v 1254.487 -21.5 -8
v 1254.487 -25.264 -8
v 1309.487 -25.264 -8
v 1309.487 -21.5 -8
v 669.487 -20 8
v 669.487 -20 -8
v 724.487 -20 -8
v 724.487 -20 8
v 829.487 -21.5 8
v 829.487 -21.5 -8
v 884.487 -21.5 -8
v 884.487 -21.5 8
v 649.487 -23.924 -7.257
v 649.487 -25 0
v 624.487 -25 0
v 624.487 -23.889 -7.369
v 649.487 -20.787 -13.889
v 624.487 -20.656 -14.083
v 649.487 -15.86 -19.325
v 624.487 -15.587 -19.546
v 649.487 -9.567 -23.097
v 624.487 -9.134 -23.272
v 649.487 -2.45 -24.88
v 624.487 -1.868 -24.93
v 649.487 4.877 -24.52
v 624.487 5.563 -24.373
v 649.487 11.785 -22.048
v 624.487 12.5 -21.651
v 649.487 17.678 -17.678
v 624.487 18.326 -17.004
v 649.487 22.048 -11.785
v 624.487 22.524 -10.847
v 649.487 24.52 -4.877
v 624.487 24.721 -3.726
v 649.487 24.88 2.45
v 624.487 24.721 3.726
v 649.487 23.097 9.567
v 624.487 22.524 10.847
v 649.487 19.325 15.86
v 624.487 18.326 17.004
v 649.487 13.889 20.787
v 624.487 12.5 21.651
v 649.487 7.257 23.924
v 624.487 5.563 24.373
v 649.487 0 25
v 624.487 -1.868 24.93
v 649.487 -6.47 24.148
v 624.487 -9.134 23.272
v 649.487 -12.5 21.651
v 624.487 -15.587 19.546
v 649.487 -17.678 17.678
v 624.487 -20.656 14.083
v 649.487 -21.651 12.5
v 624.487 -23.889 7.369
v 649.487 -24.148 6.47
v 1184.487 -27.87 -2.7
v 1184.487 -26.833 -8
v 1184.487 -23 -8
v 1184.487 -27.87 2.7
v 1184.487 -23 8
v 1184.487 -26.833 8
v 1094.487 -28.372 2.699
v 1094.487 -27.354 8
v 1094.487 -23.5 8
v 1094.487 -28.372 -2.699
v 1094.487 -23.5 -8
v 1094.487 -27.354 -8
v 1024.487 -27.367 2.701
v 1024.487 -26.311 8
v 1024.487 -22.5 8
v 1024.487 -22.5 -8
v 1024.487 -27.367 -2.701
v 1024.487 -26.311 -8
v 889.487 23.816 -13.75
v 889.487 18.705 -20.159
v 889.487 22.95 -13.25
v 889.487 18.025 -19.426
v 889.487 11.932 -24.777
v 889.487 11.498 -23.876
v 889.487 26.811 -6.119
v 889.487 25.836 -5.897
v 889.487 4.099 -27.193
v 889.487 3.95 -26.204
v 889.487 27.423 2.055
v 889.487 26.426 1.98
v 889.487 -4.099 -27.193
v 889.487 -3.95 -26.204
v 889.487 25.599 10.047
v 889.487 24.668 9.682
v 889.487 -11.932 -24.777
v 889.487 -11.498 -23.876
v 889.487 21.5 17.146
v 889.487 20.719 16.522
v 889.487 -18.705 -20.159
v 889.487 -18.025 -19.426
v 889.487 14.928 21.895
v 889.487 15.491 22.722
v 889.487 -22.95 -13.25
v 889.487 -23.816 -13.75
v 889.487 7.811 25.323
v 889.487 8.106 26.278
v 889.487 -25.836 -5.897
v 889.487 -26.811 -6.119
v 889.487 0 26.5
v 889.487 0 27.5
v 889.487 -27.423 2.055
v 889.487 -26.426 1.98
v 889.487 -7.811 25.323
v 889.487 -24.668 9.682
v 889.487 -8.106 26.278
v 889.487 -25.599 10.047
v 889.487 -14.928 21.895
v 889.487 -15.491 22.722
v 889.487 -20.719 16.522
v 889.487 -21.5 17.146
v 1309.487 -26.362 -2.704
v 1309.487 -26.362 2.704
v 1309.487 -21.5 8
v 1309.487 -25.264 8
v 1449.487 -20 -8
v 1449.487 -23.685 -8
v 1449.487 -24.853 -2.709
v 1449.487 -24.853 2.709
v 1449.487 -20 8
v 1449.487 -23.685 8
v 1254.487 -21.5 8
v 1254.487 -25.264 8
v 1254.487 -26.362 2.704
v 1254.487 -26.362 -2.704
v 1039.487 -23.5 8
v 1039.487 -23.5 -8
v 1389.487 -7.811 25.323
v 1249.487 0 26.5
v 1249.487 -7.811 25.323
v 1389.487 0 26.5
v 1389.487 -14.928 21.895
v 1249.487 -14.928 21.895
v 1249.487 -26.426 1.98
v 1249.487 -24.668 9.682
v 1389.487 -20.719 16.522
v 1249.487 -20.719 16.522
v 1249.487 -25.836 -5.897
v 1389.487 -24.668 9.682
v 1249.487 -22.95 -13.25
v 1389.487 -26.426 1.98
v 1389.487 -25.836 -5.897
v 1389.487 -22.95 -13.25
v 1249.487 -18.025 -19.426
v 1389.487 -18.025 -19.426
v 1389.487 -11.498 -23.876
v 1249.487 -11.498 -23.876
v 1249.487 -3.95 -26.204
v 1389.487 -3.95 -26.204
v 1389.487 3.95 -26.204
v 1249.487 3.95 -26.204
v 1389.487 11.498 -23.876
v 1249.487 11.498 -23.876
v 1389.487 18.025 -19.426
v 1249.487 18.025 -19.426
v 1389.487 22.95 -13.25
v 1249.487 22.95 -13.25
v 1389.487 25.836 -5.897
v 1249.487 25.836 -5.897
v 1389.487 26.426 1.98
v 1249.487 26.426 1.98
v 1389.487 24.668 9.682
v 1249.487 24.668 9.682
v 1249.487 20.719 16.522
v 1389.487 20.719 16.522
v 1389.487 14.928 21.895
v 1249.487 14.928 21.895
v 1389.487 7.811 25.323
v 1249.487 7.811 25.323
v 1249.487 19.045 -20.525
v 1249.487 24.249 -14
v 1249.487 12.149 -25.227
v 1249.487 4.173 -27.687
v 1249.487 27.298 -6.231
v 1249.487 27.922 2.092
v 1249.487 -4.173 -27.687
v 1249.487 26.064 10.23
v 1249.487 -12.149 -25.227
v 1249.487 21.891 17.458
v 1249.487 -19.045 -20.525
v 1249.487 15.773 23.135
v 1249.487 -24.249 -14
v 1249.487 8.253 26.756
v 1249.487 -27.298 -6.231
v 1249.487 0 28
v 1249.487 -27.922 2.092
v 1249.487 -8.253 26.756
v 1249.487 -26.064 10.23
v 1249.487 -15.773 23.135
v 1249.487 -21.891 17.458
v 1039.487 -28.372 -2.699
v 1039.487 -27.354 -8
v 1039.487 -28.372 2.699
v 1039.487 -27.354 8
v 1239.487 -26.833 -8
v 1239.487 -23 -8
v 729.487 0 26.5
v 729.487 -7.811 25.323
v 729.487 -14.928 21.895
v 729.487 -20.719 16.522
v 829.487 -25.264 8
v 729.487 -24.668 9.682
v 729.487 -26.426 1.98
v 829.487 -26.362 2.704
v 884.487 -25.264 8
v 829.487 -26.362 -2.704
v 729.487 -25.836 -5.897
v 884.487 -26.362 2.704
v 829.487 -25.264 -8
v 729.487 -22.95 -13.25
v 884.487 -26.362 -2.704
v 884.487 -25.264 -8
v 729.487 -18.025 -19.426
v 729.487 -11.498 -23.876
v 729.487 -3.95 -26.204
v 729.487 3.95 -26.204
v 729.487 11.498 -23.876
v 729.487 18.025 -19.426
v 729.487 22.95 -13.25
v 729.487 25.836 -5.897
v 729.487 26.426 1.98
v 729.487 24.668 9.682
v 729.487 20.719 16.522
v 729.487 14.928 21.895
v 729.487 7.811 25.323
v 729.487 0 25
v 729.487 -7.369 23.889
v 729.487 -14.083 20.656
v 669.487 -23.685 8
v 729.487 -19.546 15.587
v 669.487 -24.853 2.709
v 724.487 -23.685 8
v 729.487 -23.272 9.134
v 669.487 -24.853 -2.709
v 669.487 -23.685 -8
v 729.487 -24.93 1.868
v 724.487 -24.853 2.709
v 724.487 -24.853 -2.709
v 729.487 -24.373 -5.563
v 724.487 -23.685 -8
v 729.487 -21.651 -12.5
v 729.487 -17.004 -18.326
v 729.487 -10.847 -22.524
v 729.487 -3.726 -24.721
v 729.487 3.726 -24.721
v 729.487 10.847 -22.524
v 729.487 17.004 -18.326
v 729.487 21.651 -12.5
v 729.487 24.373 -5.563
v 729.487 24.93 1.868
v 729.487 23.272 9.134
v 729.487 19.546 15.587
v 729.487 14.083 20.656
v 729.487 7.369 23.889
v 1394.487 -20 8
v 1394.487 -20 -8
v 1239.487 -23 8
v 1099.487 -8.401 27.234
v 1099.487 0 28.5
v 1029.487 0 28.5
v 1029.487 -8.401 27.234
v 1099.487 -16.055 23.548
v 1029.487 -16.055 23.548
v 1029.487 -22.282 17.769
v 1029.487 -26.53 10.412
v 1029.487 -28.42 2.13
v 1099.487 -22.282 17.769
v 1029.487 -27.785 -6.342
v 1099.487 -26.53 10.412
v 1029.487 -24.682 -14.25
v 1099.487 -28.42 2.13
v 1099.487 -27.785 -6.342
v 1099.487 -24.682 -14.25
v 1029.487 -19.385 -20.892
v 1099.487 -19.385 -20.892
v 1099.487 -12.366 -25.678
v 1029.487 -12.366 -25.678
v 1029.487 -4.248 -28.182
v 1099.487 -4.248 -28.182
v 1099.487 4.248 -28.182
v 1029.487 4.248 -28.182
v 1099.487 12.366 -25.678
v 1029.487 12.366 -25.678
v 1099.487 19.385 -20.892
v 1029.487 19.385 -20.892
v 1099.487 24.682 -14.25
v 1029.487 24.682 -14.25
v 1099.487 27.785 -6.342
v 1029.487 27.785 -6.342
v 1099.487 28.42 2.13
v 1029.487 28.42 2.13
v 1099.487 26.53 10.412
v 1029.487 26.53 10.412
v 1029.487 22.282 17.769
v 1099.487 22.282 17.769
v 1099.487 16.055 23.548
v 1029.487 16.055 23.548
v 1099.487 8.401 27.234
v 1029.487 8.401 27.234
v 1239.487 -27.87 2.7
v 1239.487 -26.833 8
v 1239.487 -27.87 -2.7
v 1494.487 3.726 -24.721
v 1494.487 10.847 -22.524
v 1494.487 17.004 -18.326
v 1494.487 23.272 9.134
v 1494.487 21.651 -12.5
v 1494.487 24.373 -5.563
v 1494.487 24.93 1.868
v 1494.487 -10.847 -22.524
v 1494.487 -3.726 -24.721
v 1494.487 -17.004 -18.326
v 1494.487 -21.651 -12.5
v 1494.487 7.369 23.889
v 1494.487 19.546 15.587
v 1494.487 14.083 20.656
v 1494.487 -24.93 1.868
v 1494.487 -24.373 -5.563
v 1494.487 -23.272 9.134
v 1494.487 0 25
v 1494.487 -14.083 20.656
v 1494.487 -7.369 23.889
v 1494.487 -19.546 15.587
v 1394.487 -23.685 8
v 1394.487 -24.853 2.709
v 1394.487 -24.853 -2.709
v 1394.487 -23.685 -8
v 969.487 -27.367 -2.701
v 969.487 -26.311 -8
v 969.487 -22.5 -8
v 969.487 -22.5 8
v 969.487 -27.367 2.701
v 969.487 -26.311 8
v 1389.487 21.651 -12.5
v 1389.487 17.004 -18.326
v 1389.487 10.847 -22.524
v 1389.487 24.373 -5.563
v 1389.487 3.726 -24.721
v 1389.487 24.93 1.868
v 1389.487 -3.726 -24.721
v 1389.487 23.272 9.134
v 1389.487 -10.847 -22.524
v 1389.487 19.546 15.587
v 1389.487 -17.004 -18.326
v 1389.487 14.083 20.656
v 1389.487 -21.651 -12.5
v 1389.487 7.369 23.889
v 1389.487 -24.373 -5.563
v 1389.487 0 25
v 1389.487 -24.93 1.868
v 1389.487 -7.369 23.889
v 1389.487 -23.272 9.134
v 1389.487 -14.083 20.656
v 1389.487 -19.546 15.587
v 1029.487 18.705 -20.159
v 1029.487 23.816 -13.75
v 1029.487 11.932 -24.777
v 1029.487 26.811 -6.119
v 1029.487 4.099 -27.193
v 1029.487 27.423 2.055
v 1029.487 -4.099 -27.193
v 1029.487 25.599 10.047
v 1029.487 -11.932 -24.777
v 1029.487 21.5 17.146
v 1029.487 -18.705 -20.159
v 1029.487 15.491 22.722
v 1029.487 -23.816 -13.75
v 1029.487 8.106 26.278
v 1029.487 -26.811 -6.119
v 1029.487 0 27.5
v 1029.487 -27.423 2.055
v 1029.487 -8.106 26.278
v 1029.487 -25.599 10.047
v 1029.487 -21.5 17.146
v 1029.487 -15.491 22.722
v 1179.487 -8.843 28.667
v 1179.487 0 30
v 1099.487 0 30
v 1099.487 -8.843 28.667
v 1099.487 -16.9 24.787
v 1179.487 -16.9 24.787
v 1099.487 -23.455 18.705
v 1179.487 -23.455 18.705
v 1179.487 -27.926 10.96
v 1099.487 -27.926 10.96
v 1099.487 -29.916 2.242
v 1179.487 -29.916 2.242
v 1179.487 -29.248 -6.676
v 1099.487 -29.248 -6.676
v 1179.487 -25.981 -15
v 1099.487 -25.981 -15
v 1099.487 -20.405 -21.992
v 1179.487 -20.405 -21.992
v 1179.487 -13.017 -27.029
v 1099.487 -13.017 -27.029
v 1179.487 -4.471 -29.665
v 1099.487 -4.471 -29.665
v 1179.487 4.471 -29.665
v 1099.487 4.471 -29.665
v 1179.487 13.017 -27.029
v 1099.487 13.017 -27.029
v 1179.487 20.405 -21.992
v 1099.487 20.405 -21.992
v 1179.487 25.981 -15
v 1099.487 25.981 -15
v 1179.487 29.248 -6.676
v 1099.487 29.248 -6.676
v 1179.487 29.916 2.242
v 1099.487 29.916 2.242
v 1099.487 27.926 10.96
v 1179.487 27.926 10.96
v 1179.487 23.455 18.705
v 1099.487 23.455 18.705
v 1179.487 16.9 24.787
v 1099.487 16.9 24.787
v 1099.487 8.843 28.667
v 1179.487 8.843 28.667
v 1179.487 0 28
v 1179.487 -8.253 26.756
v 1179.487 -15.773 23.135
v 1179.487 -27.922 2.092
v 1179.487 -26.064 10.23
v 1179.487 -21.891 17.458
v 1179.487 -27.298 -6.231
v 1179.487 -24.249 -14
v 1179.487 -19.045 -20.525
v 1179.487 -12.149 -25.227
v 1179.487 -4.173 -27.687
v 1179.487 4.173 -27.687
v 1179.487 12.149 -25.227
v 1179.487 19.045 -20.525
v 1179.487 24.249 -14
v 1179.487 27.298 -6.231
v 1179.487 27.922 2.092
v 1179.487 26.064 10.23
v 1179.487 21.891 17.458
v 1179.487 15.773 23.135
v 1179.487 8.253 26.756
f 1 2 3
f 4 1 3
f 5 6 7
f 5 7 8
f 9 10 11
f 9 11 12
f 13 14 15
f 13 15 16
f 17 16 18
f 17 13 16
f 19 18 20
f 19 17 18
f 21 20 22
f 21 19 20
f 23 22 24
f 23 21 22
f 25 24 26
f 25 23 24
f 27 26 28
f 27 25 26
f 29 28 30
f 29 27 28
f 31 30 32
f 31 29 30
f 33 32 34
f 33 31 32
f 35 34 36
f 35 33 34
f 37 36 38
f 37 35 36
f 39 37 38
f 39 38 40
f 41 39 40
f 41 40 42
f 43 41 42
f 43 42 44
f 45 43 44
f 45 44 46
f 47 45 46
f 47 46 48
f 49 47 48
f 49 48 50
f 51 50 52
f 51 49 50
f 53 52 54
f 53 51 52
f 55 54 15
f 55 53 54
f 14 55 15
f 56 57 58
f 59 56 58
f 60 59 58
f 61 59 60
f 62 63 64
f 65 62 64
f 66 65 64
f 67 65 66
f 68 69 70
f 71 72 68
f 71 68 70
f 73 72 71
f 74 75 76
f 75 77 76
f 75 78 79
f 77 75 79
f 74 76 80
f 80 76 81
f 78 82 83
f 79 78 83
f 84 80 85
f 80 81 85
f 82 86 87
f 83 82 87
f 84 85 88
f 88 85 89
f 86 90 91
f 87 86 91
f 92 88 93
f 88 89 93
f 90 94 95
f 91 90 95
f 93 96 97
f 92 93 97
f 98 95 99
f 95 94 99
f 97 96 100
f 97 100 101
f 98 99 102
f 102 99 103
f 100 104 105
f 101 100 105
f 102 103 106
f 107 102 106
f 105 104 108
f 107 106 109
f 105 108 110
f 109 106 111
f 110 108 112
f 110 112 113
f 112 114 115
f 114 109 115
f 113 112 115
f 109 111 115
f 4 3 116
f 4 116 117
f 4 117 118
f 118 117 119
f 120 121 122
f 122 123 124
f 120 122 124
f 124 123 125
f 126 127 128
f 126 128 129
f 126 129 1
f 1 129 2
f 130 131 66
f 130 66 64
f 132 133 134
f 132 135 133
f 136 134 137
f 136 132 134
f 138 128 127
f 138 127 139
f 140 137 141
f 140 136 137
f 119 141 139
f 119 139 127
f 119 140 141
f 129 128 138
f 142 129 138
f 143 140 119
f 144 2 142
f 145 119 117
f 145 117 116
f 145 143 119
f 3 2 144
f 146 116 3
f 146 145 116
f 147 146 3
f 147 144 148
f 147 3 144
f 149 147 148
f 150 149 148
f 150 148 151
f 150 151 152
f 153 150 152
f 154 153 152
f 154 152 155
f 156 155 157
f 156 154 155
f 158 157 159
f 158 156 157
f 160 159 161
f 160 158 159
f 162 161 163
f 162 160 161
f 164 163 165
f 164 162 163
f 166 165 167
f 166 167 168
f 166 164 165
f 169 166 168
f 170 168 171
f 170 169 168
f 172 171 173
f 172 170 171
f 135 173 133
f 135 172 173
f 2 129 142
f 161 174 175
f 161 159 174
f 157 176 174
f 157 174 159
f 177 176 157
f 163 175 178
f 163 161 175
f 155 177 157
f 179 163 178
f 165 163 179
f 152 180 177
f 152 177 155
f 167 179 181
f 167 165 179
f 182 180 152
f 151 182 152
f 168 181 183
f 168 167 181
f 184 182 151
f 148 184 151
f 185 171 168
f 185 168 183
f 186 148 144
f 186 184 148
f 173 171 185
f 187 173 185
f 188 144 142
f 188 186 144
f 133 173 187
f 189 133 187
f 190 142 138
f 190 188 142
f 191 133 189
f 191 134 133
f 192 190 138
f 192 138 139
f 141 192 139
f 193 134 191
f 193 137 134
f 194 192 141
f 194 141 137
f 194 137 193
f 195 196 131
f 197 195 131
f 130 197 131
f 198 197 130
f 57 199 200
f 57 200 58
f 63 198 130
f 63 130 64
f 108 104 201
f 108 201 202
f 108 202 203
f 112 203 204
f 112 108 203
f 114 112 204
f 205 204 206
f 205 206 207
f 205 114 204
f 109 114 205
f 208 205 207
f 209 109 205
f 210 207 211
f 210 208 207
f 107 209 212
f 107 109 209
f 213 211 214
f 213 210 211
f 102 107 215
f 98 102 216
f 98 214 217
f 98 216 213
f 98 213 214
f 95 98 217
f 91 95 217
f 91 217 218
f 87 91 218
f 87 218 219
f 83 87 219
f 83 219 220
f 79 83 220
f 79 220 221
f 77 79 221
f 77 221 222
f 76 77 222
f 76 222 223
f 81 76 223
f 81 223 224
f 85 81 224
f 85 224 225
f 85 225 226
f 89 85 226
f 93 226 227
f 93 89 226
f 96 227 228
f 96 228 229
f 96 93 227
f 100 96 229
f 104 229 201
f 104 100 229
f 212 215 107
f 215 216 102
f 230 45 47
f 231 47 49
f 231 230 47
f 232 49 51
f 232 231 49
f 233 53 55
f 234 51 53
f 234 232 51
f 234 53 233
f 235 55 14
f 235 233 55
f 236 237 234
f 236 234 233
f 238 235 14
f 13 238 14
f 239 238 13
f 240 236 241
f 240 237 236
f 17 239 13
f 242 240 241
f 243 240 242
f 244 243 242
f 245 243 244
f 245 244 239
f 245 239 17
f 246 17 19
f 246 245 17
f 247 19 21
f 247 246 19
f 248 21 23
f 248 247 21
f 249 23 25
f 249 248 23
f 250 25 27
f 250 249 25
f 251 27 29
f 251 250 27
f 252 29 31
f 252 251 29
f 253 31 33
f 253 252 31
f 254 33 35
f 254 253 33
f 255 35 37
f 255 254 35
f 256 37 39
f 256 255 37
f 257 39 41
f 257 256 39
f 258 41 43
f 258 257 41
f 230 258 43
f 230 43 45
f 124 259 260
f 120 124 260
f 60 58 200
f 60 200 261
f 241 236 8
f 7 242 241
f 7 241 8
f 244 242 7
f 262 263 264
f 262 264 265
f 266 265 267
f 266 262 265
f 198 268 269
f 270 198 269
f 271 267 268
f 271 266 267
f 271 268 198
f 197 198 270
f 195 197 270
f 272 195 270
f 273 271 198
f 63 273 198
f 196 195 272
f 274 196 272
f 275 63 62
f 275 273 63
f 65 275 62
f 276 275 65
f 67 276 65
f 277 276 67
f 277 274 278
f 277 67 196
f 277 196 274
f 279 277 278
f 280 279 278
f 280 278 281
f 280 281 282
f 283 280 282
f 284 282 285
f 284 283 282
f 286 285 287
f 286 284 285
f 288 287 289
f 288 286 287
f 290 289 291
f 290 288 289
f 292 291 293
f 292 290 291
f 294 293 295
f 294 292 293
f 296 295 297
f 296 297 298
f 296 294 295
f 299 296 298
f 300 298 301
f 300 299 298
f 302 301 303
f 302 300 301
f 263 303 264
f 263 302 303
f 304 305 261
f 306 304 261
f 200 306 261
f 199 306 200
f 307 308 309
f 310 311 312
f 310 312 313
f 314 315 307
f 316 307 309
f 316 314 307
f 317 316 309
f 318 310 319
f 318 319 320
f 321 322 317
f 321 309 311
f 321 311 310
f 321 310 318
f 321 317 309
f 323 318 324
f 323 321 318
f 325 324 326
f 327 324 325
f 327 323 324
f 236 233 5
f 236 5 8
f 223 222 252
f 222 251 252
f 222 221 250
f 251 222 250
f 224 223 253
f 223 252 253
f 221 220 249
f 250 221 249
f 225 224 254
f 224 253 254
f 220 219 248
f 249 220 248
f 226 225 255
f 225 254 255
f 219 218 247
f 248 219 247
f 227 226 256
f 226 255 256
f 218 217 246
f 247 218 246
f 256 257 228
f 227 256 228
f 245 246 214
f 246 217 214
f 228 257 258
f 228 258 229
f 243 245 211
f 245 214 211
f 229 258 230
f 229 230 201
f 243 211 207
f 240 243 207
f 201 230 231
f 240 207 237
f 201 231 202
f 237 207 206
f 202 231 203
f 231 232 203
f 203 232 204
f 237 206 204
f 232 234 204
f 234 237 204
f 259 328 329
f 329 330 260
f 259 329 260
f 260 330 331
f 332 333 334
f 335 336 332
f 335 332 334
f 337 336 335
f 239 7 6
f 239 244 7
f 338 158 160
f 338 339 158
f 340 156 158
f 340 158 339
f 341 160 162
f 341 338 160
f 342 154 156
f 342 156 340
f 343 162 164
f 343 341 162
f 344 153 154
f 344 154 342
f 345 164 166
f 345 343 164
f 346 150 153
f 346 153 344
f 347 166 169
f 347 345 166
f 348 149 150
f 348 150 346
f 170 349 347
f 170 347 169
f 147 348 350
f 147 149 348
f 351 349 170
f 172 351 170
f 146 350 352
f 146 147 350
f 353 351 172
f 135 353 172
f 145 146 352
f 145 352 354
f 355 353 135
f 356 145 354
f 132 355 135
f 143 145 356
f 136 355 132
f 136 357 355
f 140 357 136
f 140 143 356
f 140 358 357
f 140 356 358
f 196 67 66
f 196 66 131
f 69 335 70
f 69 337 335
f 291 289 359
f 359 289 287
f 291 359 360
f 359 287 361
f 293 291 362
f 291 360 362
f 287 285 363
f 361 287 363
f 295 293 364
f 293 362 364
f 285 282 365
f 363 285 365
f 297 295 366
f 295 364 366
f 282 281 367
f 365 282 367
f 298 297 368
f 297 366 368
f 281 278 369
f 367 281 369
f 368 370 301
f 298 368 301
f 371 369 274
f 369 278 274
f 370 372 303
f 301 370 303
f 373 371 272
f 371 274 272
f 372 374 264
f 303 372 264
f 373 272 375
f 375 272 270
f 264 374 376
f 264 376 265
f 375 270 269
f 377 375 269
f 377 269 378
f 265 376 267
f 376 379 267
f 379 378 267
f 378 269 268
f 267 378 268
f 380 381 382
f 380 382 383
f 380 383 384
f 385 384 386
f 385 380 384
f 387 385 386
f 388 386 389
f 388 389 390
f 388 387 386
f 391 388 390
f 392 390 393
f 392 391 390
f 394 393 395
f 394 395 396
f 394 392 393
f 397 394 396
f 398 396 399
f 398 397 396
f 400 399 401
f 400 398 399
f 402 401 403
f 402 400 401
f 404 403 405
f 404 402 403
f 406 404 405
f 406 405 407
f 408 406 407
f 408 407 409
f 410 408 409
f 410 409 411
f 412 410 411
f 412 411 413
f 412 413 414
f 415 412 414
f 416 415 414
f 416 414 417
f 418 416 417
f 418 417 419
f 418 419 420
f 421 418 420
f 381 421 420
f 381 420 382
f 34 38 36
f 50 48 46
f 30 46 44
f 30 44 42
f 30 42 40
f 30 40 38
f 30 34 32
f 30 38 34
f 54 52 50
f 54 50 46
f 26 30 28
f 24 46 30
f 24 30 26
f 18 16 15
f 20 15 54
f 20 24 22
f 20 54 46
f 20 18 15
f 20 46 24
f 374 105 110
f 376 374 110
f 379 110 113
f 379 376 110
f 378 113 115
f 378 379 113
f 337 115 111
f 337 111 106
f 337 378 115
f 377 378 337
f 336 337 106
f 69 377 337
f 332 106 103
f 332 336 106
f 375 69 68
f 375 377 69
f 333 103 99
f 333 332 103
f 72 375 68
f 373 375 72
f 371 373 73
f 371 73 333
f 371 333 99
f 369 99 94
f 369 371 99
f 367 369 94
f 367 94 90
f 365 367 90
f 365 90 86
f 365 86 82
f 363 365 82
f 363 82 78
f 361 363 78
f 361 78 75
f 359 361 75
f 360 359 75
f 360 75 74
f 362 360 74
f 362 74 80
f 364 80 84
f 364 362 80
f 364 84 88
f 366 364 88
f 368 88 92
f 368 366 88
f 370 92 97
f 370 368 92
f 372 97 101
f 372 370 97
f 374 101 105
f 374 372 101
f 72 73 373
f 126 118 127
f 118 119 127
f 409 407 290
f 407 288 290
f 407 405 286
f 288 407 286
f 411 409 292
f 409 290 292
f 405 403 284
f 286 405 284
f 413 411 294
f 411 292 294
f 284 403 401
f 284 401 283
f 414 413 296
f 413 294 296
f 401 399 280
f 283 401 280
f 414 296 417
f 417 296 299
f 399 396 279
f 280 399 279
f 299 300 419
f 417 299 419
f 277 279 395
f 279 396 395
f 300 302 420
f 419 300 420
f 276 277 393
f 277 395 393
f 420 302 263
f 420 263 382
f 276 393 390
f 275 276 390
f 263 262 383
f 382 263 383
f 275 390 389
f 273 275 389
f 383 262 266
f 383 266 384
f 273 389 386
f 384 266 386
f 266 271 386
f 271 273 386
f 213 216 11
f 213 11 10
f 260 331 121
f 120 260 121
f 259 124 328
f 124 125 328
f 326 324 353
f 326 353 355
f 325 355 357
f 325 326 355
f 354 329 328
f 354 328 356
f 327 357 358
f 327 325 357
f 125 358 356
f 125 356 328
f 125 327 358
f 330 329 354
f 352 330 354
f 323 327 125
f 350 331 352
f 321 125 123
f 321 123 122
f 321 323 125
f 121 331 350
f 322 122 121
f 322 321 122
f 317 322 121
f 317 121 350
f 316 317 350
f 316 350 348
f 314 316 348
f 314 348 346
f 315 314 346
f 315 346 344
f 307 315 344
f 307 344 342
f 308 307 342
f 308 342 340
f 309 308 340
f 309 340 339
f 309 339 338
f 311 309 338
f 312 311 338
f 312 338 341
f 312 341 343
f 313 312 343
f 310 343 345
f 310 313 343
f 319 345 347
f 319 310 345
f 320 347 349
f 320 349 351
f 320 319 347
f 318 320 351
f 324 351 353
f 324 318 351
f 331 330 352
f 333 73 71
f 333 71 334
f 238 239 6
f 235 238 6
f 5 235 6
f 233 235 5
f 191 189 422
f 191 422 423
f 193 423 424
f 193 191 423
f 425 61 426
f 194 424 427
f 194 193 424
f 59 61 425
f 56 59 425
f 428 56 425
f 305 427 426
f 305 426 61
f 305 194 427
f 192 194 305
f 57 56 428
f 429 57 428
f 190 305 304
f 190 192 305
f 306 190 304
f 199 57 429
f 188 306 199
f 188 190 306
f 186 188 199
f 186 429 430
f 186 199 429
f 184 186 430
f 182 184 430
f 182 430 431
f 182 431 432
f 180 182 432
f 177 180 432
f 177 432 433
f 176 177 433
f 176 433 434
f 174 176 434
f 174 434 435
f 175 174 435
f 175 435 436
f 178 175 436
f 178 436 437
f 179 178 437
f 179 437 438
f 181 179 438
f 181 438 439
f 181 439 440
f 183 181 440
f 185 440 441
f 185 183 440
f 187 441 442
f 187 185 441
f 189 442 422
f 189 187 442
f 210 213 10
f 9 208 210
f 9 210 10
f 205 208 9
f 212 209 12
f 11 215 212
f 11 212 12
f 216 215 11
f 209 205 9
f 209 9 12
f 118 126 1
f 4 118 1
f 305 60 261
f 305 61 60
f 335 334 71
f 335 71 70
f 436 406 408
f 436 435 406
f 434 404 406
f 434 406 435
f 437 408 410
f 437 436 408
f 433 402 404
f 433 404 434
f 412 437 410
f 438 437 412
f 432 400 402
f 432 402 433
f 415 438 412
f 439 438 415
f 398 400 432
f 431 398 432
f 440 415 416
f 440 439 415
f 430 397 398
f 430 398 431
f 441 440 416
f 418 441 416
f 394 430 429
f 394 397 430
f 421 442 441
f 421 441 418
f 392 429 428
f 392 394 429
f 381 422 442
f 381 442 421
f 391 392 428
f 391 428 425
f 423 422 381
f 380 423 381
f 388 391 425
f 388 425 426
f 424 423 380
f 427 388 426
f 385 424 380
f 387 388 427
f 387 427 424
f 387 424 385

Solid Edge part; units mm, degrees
sketch "Sketch1" plane through (0, 0, 0) normal (0, -1, 0) x (1, 0, 0)
  line L0 (1469.4867, 25) -> (1469.4867, 0)
  line L1 (1469.4867, 0) -> (649.4867, 0)
  line L2 (649.4867, 0) -> (649.4867, 25)
  line L3 (649.4867, 25) -> (729.4867, 25)
  line L4 (729.4867, 25) -> (729.4867, 26.5)
  line L5 (729.4867, 26.5) -> (889.4867, 26.5)
  line L6 (889.4867, 26.5) -> (889.4867, 27.5)
  line L7 (889.4867, 27.5) -> (1029.4867, 27.5)
  line L8 (1029.4867, 27.5) -> (1029.4867, 28.5)
  line L9 (1029.4867, 28.5) -> (1099.4867, 28.5)
  line L10 (1099.4867, 28.5) -> (1099.4867, 30)
  line L11 (1099.4867, 30) -> (1179.4867, 30)
  line L12 (1179.4867, 30) -> (1179.4867, 28)
  line L13 (1179.4867, 28) -> (1249.4867, 28)
  line L14 (1249.4867, 28) -> (1249.4867, 26.5)
  line L15 (1249.4867, 26.5) -> (1389.4867, 26.5)
  line L16 (1389.4867, 26.5) -> (1389.4867, 25)
  line L17 (1389.4867, 25) -> (1469.4867, 25)
revolve "RevolvedProtrusion1" add sketch "Sketch1" angle 360 about axis through (0, 0, 0) along (1, 0, 0)
sketch "Sketch2" plane through (689.4867, -25, 0) normal (0, -1, 0) x (-1, 0, 0)
  line L0 (20, -8) -> (-35, -8)
  line L1 (-35, -8) -> (-35, 0)
  line L2 (-35, 0) -> (-35, 8)
  line L3 (-35, 8) -> (20, 8)
  line L4 (20, 8) -> (20, -8)
extrude "Cutout1" cut sketch "Sketch2" against normal blind 5
sketch "Sketch3" plane through (809.4867, -26.5, 0) normal (0, -1, 0) x (-1, 0, 0)
  line L0 (-75, 0) -> (-75, 8)
  line L1 (-75, 8) -> (-20, 8)
  line L2 (-20, 8) -> (-20, -8)
  line L3 (-20, -8) -> (-75, -8)
  line L4 (-75, -8) -> (-75, 0)
  dimension "D1" = 55
  dimension "D2" = 60
extrude "Cutout2" cut sketch "Sketch3" against normal blind 5
sketch "Sketch4" plane through (959.4867, -27.5, 0) normal (0, -1, 0) x (-1, 0, 0)
  line L0 (-65, 0) -> (-65, 8)
  line L1 (-65, 8) -> (-10, 8)
  line L2 (-10, 8) -> (-10, -8)
  line L3 (-10, -8) -> (-65, -8)
  line L4 (-65, -8) -> (-65, 0)
  dimension "D1" = 55
  dimension "D2" = 16
  dimension "D3" = 60
extrude "Keyway_Thickness" cut sketch "Sketch4" against normal blind 5
sketch "Sketch5" plane through (1064.4867, -28.5, 0) normal (0, -1, 0) x (-1, 0, 0)
  line L0 (-30, 0) -> (-30, 8)
  line L1 (-30, 8) -> (25, 8)
  line L2 (25, 8) -> (25, -8)
  line L3 (25, -8) -> (-30, -8)
  line L4 (-30, -8) -> (-30, 0)
  dimension "D1" = 55
  dimension "D2" = 16
  dimension "D3" = 60
extrude "Cutout3" cut sketch "Sketch5" against normal blind 5
sketch "Sketch6" plane through (1214.4867, -28, 0) normal (0, -1, 0) x (-1, 0, 0)
  line L0 (-25, 0) -> (-25, 8)
  line L1 (-25, 8) -> (30, 8)
  line L2 (30, 8) -> (30, -8)
  line L3 (30, -8) -> (-25, -8)
  line L4 (-25, -8) -> (-25, 0)
  dimension "D1" = 16
  dimension "D2" = 55
  dimension "D3" = 60
extrude "Cutout4" cut sketch "Sketch6" against normal blind 5
sketch "Sketch7" plane through (1319.4867, -26.5, 0) normal (0, -1, 0) x (-1, 0, 0)
  line L0 (65, 0) -> (65, 8)
  line L1 (65, 8) -> (10, 8)
  line L2 (10, 8) -> (10, -8)
  line L3 (10, -8) -> (65, -8)
  line L4 (65, -8) -> (65, 0)
  dimension "D1" = 55
  dimension "D2" = 16
  dimension "D3" = 60
extrude "Cutout5" cut sketch "Sketch7" against normal blind 5
sketch "Sketch8" plane through (1429.4867, -25, 0) normal (0, -1, 0) x (-1, 0, 0)
  line L0 (35, 0) -> (35, 8)
  line L1 (35, 8) -> (-20, 8)
  line L2 (-20, 8) -> (-20, -8)
  line L3 (-20, -8) -> (35, -8)
  line L4 (35, -8) -> (35, 0)
  dimension "D1" = 55
  dimension "D2" = 16
  dimension "D3" = 60
extrude "Cutout6" cut sketch "Sketch8" against normal blind 5
sketch "Sketch9" plane through (649.4867, 0, 0) normal (-1, 0, 0) x (0, -1, 0)
  circle A0 centre (0, 0) radius 25
  dimension "D1" = 50
extrude "Protrusion1" add sketch "Sketch9" along normal blind 25
sketch "Sketch10" plane through (1469.4867, 0, 0) normal (1, 0, 0) x (0, 0, 1)
  circle A0 centre (0, 0) radius 25
  dimension "D1" = 50
extrude "Protrusion2" add sketch "Sketch10" along normal blind 25
